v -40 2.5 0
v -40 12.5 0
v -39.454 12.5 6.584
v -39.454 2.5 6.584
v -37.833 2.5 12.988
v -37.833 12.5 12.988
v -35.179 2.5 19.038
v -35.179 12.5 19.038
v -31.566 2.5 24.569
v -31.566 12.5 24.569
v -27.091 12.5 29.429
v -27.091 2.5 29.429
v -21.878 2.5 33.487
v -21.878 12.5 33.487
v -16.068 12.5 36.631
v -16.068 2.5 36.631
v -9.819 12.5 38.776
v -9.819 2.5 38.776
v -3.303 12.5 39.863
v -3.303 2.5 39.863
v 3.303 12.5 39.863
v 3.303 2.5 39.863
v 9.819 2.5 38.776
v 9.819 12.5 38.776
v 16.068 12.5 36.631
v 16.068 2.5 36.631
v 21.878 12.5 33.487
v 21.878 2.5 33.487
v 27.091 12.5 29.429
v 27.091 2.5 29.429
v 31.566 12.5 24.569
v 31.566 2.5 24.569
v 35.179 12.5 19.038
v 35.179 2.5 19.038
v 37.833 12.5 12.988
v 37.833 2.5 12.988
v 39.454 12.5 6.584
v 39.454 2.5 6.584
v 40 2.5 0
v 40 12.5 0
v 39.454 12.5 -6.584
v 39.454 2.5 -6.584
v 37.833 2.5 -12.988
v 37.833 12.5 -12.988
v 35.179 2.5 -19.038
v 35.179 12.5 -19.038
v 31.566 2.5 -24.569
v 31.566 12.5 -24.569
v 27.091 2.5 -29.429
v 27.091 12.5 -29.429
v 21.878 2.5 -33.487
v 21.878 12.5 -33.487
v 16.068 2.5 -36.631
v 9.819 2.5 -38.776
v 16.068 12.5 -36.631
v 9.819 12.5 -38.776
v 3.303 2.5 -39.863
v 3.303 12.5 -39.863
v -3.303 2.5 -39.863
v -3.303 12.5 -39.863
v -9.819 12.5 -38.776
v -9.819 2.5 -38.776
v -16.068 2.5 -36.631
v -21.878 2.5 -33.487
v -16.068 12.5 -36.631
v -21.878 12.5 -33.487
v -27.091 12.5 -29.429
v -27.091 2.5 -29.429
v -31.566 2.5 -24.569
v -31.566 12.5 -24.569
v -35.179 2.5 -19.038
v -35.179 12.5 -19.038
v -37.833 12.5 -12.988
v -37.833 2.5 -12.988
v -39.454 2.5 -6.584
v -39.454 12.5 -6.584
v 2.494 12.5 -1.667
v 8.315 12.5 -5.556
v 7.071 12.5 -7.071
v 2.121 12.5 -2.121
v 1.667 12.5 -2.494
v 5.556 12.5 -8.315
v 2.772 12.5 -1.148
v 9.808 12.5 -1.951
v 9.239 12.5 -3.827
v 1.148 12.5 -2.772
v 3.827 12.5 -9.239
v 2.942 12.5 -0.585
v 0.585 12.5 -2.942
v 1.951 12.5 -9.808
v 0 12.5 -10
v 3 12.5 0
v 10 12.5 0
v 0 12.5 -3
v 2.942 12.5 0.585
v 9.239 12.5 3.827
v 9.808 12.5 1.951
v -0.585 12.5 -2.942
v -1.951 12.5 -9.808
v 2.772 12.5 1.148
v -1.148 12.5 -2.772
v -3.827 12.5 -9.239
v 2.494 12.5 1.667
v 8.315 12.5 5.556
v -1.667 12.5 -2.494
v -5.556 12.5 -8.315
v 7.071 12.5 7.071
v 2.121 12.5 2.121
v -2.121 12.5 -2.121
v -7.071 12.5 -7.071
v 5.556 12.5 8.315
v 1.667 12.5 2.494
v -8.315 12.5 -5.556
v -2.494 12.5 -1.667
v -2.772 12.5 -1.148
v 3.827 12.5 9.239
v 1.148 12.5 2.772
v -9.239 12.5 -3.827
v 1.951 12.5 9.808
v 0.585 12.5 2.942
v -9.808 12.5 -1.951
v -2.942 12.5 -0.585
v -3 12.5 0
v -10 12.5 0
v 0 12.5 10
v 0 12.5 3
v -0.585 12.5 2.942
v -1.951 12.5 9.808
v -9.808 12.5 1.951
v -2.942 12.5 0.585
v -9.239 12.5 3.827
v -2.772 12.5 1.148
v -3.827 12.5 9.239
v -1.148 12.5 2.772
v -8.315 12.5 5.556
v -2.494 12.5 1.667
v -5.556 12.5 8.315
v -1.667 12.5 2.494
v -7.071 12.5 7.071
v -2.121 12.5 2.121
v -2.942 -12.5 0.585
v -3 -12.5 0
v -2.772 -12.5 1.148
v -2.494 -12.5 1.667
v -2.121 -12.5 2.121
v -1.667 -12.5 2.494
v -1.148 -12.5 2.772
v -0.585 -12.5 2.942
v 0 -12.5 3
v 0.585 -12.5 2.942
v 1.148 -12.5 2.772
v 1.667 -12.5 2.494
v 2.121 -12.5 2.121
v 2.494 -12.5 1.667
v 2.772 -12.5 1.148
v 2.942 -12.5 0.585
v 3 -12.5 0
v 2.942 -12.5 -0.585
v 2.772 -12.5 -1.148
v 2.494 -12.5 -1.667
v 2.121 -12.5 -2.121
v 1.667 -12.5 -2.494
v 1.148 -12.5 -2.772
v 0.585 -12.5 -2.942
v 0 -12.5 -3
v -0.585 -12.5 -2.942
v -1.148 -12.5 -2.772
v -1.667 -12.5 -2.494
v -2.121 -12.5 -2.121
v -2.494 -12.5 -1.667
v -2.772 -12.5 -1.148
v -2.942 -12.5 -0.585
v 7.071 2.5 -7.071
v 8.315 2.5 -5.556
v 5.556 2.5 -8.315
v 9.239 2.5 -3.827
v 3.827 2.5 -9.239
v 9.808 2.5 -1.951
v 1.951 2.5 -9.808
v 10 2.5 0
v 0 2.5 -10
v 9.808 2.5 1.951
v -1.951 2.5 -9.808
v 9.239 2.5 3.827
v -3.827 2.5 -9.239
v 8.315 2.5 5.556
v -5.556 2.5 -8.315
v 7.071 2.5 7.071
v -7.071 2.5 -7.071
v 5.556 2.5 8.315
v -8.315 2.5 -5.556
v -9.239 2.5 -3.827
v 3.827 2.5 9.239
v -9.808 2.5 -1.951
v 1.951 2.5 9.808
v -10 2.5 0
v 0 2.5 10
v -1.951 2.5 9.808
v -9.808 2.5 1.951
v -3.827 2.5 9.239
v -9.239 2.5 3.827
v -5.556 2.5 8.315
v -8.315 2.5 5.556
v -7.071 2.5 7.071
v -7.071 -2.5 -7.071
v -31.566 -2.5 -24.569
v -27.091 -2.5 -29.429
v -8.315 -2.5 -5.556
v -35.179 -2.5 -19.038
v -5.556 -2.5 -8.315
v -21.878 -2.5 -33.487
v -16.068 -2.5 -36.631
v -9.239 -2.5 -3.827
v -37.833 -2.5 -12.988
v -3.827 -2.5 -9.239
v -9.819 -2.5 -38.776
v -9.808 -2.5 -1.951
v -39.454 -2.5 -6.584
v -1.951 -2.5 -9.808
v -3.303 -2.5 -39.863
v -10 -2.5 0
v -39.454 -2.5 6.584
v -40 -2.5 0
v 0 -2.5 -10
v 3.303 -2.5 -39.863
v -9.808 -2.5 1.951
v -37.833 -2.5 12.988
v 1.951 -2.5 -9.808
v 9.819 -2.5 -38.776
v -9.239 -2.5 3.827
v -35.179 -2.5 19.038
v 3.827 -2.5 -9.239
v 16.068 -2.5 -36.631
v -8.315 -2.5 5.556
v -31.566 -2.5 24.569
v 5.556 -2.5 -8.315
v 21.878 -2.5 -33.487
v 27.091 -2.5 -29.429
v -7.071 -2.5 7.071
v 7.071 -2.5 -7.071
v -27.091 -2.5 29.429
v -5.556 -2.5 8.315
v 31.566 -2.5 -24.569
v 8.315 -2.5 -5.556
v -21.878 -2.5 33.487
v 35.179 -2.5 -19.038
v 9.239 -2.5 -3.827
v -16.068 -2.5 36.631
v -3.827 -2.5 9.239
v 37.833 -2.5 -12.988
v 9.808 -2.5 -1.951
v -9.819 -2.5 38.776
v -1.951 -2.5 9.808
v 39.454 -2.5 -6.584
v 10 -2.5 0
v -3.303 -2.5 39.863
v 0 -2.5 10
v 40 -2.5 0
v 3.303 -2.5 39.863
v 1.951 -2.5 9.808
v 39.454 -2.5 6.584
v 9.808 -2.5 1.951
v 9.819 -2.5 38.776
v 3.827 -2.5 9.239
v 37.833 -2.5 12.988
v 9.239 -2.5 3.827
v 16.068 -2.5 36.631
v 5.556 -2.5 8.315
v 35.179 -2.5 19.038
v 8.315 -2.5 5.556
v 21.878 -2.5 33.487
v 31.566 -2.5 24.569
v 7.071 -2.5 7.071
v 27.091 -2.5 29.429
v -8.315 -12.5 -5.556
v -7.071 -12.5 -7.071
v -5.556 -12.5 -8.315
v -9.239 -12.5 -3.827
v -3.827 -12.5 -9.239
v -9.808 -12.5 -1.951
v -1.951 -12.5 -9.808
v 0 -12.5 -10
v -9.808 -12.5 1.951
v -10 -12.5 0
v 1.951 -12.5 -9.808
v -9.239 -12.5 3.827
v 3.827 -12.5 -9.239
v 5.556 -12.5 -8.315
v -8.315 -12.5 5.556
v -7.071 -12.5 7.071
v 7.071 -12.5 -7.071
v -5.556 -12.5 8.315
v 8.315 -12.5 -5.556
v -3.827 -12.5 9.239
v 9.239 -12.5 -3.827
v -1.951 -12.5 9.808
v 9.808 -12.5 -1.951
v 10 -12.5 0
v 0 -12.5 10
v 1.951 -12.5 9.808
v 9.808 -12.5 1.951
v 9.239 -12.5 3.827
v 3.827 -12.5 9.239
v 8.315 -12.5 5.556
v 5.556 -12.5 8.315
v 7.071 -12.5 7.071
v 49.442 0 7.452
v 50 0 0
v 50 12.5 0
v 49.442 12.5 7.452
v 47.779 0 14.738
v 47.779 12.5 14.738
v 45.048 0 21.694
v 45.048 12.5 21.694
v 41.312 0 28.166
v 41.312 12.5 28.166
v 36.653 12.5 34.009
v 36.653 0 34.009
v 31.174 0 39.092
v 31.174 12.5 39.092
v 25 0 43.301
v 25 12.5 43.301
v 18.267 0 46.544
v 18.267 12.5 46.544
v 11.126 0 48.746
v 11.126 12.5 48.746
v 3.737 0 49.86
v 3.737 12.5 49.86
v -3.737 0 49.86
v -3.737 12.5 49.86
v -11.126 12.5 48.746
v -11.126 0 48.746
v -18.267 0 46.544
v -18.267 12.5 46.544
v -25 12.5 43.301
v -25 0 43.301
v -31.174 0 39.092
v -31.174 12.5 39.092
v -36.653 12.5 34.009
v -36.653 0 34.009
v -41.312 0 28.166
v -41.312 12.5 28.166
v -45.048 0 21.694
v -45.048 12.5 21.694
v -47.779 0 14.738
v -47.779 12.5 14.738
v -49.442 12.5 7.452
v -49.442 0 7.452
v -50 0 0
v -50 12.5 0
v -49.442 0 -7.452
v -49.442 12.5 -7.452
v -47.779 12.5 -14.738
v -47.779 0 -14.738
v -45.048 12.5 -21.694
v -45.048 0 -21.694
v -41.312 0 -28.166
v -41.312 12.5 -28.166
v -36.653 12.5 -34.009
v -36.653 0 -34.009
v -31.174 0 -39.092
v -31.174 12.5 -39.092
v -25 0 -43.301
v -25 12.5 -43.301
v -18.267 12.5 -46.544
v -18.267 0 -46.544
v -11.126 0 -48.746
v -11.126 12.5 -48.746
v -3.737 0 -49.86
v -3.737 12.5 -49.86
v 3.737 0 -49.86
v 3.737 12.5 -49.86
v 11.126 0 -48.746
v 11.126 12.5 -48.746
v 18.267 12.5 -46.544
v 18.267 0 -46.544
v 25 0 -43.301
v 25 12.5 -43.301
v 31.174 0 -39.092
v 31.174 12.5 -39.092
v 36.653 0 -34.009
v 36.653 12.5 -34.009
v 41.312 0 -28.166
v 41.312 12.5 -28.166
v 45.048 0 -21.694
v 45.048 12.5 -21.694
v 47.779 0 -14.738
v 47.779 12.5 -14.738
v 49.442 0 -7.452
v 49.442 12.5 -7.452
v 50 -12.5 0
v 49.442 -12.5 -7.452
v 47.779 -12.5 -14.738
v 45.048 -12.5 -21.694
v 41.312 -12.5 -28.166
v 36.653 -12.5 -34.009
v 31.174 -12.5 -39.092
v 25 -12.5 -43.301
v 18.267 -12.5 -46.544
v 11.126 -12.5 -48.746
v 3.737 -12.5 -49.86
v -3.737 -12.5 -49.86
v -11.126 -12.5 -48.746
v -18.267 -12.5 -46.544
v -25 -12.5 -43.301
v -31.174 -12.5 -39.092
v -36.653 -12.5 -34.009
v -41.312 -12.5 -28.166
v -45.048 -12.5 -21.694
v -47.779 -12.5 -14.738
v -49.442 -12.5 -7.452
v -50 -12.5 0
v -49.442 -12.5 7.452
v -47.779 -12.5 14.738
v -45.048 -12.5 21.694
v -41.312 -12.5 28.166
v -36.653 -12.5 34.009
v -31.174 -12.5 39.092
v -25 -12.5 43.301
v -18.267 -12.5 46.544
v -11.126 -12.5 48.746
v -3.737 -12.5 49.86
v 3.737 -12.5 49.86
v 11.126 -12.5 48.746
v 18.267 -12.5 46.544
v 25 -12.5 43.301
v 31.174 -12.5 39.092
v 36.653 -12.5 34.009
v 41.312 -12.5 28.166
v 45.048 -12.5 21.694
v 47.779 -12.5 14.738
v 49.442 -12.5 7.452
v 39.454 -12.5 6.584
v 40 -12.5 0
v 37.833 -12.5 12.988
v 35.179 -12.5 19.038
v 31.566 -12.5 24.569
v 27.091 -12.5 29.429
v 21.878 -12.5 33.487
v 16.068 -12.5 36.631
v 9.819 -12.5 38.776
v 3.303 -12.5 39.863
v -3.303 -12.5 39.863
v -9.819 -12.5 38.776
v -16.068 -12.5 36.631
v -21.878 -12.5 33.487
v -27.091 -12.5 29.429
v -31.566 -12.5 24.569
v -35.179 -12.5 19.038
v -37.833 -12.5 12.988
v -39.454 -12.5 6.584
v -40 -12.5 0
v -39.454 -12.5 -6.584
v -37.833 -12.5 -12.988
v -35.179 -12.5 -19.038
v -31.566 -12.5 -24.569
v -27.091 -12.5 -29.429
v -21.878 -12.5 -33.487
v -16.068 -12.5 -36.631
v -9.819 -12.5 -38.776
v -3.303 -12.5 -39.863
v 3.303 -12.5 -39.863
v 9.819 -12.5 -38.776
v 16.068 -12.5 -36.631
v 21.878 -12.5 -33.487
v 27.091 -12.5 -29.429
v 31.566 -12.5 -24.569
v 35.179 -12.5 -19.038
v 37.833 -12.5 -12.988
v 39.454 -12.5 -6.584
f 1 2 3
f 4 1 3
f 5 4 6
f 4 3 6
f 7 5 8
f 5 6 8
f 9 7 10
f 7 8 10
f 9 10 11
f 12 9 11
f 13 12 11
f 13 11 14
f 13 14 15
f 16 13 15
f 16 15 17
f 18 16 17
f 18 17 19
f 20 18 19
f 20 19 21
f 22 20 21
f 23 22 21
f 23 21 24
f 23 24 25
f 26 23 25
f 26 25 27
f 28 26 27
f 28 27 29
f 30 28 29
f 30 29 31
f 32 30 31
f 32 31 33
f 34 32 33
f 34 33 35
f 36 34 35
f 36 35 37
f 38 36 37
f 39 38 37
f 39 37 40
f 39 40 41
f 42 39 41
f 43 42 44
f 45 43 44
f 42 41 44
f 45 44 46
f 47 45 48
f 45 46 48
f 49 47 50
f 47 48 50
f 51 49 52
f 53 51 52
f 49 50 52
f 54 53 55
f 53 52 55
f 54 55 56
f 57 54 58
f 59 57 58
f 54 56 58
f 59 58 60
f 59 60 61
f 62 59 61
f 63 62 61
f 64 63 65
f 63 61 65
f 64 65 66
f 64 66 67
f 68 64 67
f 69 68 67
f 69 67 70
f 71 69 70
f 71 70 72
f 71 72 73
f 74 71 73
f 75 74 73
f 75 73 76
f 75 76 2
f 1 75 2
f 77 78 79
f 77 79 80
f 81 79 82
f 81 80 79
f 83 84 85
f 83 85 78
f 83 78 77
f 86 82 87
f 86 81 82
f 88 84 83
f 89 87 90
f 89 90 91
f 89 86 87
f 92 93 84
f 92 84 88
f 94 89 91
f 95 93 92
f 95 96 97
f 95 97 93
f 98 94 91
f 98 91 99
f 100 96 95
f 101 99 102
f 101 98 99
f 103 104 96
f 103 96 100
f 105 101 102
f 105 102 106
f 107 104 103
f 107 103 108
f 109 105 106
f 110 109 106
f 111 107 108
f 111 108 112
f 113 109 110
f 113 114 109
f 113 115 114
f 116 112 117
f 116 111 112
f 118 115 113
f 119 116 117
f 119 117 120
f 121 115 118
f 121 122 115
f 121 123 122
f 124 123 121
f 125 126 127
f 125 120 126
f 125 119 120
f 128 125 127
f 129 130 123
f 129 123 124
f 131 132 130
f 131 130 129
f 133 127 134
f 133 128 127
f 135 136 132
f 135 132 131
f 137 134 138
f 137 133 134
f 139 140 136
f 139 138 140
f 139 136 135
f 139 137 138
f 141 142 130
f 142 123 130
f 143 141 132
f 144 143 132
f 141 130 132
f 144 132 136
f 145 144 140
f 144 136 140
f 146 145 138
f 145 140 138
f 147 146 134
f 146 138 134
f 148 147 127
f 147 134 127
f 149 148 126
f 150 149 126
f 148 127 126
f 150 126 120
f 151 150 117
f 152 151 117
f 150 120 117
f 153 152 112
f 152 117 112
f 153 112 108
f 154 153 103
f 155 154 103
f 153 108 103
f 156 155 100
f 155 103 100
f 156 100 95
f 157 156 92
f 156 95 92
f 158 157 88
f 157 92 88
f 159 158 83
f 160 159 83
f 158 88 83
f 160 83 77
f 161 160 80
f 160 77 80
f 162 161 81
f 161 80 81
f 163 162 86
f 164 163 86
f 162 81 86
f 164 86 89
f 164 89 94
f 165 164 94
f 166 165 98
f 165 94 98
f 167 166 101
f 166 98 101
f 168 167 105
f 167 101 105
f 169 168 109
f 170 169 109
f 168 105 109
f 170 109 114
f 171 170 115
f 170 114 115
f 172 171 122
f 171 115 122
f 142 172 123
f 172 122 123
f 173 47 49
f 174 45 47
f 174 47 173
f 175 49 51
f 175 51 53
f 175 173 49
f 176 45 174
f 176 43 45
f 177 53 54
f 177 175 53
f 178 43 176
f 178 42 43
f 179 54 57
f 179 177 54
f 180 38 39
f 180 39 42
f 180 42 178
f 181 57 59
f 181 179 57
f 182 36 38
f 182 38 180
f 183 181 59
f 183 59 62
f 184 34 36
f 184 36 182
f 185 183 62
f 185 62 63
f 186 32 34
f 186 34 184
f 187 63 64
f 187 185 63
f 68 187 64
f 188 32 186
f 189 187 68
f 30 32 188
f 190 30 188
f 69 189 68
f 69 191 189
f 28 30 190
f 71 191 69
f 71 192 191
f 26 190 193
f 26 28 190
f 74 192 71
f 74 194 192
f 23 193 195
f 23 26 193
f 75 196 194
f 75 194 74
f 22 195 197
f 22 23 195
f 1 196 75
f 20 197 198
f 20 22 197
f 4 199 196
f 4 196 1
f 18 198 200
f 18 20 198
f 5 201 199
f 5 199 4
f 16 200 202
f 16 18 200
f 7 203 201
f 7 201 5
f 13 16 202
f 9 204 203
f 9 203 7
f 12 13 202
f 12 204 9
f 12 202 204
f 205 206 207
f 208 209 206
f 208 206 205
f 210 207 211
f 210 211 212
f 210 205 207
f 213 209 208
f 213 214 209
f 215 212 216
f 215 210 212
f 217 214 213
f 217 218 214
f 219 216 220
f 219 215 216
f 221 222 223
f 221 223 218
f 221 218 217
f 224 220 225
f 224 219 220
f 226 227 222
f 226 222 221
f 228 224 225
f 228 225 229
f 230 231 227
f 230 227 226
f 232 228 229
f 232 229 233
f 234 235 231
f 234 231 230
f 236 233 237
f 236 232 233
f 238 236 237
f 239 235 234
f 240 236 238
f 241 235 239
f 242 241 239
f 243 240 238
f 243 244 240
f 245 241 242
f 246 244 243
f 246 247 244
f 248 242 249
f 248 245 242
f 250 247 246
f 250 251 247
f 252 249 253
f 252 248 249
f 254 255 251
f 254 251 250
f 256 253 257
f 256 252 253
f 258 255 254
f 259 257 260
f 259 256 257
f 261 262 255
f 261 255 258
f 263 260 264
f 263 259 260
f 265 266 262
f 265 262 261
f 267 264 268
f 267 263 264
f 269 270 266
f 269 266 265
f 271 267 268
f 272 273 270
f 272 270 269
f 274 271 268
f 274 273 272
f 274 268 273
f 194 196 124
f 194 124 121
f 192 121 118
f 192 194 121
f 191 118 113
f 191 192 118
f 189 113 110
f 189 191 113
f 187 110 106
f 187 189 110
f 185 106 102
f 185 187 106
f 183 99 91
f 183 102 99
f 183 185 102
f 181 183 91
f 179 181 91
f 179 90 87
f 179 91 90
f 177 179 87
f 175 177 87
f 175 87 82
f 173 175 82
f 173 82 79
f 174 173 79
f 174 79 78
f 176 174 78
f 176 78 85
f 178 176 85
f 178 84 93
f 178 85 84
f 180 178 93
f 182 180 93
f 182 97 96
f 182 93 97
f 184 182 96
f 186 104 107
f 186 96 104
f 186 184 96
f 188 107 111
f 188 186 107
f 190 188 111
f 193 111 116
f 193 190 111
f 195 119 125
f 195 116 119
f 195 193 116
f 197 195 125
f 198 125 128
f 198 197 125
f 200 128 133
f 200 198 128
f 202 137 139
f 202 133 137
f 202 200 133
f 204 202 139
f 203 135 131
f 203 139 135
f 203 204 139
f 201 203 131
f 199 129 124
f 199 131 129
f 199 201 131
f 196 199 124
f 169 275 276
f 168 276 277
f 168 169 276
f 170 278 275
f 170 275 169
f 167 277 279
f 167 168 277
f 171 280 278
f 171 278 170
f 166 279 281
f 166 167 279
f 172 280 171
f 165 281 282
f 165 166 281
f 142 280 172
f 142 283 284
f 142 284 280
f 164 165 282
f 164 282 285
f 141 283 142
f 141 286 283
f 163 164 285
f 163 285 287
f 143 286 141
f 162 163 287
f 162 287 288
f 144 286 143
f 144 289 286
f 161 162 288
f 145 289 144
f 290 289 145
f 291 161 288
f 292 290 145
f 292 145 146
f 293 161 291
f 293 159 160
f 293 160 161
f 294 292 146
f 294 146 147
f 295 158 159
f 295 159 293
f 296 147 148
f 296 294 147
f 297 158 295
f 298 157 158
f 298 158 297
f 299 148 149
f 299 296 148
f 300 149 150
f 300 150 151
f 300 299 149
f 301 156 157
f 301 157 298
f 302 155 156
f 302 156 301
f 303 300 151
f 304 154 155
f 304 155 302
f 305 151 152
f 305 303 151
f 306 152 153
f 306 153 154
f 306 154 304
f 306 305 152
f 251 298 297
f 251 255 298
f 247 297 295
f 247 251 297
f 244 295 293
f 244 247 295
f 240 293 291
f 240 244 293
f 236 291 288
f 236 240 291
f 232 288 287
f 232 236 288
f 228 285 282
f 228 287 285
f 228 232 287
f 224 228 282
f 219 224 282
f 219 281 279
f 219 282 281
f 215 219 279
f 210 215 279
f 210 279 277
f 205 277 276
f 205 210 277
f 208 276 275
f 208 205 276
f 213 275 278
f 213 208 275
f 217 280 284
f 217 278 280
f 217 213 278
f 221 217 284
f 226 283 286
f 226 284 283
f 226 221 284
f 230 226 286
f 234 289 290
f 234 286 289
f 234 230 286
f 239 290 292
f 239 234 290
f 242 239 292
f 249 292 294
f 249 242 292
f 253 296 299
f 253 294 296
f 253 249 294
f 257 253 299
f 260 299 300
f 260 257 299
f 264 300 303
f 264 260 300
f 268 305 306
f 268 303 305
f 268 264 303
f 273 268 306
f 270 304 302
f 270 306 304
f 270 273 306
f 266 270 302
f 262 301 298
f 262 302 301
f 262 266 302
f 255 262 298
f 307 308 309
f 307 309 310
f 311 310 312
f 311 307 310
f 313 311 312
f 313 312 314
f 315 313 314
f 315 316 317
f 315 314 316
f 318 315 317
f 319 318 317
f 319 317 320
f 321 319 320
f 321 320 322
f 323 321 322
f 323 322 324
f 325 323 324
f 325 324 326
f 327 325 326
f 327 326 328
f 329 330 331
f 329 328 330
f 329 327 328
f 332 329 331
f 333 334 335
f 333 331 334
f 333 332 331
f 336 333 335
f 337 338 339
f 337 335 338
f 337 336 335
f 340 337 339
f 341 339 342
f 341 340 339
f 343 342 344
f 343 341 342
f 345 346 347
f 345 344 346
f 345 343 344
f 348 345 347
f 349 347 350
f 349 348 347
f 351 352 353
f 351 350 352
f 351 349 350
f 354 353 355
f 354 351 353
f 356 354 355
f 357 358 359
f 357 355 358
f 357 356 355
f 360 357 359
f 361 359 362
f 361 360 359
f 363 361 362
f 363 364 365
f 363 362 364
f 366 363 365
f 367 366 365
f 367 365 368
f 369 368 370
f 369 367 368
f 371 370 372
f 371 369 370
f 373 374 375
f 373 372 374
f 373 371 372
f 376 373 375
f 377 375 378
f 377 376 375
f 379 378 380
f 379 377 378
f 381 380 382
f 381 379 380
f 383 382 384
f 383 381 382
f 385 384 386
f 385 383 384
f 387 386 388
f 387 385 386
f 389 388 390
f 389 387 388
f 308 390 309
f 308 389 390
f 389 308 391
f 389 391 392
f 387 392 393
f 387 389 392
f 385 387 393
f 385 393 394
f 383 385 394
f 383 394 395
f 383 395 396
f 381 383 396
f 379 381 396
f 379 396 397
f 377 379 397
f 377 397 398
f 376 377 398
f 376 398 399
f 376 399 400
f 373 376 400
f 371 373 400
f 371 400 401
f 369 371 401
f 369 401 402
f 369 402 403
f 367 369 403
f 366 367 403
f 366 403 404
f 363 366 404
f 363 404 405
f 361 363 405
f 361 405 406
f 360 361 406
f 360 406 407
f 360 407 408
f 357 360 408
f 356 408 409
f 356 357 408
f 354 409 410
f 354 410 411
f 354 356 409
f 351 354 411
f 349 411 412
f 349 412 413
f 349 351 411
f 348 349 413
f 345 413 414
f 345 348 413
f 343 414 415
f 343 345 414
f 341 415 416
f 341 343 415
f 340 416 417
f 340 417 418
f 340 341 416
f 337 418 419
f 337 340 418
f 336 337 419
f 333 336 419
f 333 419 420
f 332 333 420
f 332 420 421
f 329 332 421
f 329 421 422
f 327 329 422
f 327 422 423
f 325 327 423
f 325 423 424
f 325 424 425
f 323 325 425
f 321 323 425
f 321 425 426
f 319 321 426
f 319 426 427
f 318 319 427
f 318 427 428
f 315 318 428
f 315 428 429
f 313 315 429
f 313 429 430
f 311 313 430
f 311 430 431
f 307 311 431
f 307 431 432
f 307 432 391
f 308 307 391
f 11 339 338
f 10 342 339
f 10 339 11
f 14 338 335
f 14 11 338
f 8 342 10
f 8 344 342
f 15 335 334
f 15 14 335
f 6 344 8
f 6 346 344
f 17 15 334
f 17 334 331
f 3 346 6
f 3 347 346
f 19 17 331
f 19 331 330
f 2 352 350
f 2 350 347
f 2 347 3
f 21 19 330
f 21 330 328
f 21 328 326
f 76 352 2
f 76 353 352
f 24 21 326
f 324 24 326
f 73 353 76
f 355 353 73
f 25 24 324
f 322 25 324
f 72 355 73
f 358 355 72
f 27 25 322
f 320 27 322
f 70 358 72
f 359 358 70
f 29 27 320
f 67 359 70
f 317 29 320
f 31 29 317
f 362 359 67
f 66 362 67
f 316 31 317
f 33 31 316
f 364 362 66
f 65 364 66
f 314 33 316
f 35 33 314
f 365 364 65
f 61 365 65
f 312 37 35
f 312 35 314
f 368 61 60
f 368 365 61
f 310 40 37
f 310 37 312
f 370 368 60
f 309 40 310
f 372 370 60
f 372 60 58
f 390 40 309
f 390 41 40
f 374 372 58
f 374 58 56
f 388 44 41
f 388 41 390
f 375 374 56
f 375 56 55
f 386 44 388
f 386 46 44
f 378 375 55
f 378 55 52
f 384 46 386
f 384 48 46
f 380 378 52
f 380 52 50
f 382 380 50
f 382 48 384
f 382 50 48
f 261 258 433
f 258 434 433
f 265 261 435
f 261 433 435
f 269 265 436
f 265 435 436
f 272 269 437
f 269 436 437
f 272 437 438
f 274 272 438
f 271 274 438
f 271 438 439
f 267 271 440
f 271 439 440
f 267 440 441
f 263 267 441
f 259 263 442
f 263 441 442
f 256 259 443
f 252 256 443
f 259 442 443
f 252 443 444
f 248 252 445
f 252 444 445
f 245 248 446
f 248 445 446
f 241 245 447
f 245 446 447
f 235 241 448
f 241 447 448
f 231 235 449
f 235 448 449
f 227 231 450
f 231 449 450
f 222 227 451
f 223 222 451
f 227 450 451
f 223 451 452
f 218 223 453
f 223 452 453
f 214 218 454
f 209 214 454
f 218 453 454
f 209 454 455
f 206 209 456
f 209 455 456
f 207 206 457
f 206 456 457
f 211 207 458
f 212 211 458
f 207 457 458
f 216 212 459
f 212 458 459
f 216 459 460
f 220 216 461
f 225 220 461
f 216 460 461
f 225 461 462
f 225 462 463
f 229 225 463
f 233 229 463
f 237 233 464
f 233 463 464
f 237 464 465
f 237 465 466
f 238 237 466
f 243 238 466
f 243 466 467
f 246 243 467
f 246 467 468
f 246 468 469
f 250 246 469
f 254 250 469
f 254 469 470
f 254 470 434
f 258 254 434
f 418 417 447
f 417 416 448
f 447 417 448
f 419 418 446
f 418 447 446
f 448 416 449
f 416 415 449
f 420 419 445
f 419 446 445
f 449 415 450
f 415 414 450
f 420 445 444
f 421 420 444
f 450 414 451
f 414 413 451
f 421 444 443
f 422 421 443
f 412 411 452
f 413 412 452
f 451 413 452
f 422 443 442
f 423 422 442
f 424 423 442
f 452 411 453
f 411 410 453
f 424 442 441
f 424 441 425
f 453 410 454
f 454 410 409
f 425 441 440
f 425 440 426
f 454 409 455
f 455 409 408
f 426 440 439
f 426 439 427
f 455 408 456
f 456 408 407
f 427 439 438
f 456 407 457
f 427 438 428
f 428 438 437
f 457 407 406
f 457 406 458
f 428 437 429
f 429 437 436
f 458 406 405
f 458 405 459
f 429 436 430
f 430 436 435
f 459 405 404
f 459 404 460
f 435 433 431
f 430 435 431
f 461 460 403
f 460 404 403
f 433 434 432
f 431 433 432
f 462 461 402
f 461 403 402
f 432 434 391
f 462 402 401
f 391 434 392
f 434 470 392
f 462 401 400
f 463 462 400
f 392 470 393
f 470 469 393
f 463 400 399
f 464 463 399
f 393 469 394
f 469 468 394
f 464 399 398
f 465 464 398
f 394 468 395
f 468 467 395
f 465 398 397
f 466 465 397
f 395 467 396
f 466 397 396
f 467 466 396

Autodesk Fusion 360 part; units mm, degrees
sketch "Sketch1" plane through (0, 0, 0) normal (0, 1, 0) x (1, 0, 0)
  circle A0 centre (0, 0) radius 50
  dimension "d1" = 100
extrude "Extrude1" add sketch "Sketch1" along normal mid plane 25
sketch "Sketch2" plane through (0, -12.5, 0) normal (0, -1, 0) x (1, 0, 0)
  circle A0 centre (0, 0) radius 50
  circle A1 centre (0, 0) radius 40
  dimension "d4" = 80
extrude "Extrude2" cut sketch "Sketch2" against normal blind 10 contours A1
sketch "Sketch3" plane through (0, 12.5, 0) normal (0, 1, 0) x (-1, 0, 0)
  circle A0 centre (0, 0) radius 50
  circle A1 centre (0, 0) radius 40
  dimension "d7" = 80
extrude "Extrude3" cut sketch "Sketch3" against normal blind 10 contours A1
sketch "Sketch4" plane through (0, -2.5, 0) normal (0, -1, 0) x (1, 0, 0)
  circle A0 centre (0, 0) radius 40
  circle A1 centre (0, 0) radius 10
  dimension "d10" = 20
extrude "Extrude4" add sketch "Sketch4" along normal blind 10 contours A1
sketch "Sketch5" plane through (0, 2.5, 0) normal (0, 1, 0) x (-1, 0, 0)
  circle A0 centre (0, 0) radius 40
  circle A1 centre (0, 0) radius 10
  dimension "d13" = 20
extrude "Extrude5" add sketch "Sketch5" along normal blind 10 contours A1
sketch "Sketch6" plane through (0, 12.5, 0) normal (0, 1, 0) x (-1, 0, 0)
  circle A0 centre (0, 0) radius 10
  circle A1 centre (0, 0) radius 3
  dimension "d16" = 6
extrude "Extrude6" cut sketch "Sketch6" against normal blind 25 contours A1
